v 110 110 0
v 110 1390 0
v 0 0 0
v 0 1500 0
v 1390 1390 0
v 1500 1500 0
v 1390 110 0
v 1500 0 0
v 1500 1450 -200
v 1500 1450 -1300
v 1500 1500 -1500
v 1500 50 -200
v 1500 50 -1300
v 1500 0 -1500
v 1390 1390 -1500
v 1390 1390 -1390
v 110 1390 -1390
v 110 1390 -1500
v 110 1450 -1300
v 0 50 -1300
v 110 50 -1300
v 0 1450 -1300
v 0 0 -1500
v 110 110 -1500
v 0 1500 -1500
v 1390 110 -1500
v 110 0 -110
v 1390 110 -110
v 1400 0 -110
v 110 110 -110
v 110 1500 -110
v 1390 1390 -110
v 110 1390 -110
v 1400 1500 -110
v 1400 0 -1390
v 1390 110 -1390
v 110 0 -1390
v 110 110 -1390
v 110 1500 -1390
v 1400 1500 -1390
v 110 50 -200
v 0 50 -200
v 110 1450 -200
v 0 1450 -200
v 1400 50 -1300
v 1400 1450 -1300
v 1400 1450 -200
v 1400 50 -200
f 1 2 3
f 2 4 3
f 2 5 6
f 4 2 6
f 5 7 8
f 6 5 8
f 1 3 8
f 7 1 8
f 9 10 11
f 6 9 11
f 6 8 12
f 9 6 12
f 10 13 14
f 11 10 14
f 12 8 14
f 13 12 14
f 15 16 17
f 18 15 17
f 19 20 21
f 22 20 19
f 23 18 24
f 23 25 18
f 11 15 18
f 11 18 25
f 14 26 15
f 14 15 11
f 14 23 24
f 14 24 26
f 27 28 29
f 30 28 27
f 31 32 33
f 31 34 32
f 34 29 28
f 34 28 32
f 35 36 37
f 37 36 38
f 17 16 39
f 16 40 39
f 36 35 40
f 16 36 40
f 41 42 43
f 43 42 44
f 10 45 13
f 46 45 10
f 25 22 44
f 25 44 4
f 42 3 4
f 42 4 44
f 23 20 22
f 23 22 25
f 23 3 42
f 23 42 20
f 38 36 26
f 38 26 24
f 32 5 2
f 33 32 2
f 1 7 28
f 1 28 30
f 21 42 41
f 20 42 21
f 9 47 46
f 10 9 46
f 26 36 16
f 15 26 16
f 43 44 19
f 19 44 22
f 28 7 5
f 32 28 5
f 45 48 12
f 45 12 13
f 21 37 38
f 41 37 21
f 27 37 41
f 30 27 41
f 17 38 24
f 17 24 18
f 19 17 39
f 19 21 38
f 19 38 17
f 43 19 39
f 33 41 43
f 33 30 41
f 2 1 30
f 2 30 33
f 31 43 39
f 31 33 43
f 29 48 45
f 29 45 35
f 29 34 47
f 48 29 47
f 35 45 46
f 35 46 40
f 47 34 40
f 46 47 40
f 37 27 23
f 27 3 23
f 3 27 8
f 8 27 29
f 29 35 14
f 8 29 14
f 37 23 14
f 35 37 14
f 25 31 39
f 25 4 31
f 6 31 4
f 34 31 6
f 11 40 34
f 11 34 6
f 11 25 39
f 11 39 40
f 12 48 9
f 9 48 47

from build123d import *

# Parameters (mm, degrees)
SKETCH_3_W               = 1500
SKETCH_3_H               = 1500
EXTRUDE_1_DEPTH          = 1500
CUT_EXTRUDE_1_DEPTH      = 2346.207879912
CUT_EXTRUDE_1_DEPTH_BACK = 2346.207879912
SKETCH_4_W               = 1100
SKETCH_4_H               = 1400
CUT_EXTRUDE_2_DEPTH      = 2346.207879912
CUT_EXTRUDE_2_DEPTH_BACK = 2346.207879912
SKETCH_5_W               = 1280
SKETCH_5_H               = 1280
CUT_EXTRUDE_3_DEPTH      = 2346.207879912
CUT_EXTRUDE_3_DEPTH_BACK = 2346.207879912
SKETCH_6_W               = 1290
SKETCH_6_H               = 1280


with BuildPart() as part:
    # 草图3 → 凸台-拉伸1 (new body)
    with BuildSketch(Plane(origin=(0, 0, 0), x_dir=(1, 0, 0), z_dir=(0, 1, 0))):
        with Locations((750, 750)):
            Rectangle(SKETCH_3_W, SKETCH_3_H)
    extrude(amount=EXTRUDE_1_DEPTH)

    # 草图4 → 切除-拉伸1 (cut, two sides: drawn at the far end of the back side and taken through both)
    with BuildSketch(Plane(origin=(1000, 0, 0), x_dir=(0, 0, -1), z_dir=(1, 0, 0)).offset(-CUT_EXTRUDE_1_DEPTH_BACK)):
        with Locations((750, 750)):
            Rectangle(SKETCH_4_W, SKETCH_4_H)
    extrude(amount=CUT_EXTRUDE_1_DEPTH + CUT_EXTRUDE_1_DEPTH_BACK, mode=Mode.SUBTRACT)

    # 草图5 → 切除-拉伸2 (cut, two sides: drawn at the far end of the back side and taken through both)
    with BuildSketch(Plane(origin=(0, 0, -1000), x_dir=(-1, 0, 0), z_dir=(0, 0, -1)).offset(-CUT_EXTRUDE_2_DEPTH_BACK)):
        with Locations((-750, 750)):
            Rectangle(SKETCH_5_W, SKETCH_5_H)
    extrude(amount=CUT_EXTRUDE_2_DEPTH + CUT_EXTRUDE_2_DEPTH_BACK, mode=Mode.SUBTRACT)

    # 草图6 → 切除-拉伸3 (cut, two sides: drawn at the far end of the back side and taken through both)
    with BuildSketch(Plane(origin=(0, 500, 0), x_dir=(-1, 0, 0), z_dir=(0, -1, 0)).offset(-CUT_EXTRUDE_3_DEPTH_BACK)):
        with Locations((-755, 750)):
            Rectangle(SKETCH_6_W, SKETCH_6_H)
    extrude(amount=CUT_EXTRUDE_3_DEPTH + CUT_EXTRUDE_3_DEPTH_BACK, mode=Mode.SUBTRACT)


solid = part.part
